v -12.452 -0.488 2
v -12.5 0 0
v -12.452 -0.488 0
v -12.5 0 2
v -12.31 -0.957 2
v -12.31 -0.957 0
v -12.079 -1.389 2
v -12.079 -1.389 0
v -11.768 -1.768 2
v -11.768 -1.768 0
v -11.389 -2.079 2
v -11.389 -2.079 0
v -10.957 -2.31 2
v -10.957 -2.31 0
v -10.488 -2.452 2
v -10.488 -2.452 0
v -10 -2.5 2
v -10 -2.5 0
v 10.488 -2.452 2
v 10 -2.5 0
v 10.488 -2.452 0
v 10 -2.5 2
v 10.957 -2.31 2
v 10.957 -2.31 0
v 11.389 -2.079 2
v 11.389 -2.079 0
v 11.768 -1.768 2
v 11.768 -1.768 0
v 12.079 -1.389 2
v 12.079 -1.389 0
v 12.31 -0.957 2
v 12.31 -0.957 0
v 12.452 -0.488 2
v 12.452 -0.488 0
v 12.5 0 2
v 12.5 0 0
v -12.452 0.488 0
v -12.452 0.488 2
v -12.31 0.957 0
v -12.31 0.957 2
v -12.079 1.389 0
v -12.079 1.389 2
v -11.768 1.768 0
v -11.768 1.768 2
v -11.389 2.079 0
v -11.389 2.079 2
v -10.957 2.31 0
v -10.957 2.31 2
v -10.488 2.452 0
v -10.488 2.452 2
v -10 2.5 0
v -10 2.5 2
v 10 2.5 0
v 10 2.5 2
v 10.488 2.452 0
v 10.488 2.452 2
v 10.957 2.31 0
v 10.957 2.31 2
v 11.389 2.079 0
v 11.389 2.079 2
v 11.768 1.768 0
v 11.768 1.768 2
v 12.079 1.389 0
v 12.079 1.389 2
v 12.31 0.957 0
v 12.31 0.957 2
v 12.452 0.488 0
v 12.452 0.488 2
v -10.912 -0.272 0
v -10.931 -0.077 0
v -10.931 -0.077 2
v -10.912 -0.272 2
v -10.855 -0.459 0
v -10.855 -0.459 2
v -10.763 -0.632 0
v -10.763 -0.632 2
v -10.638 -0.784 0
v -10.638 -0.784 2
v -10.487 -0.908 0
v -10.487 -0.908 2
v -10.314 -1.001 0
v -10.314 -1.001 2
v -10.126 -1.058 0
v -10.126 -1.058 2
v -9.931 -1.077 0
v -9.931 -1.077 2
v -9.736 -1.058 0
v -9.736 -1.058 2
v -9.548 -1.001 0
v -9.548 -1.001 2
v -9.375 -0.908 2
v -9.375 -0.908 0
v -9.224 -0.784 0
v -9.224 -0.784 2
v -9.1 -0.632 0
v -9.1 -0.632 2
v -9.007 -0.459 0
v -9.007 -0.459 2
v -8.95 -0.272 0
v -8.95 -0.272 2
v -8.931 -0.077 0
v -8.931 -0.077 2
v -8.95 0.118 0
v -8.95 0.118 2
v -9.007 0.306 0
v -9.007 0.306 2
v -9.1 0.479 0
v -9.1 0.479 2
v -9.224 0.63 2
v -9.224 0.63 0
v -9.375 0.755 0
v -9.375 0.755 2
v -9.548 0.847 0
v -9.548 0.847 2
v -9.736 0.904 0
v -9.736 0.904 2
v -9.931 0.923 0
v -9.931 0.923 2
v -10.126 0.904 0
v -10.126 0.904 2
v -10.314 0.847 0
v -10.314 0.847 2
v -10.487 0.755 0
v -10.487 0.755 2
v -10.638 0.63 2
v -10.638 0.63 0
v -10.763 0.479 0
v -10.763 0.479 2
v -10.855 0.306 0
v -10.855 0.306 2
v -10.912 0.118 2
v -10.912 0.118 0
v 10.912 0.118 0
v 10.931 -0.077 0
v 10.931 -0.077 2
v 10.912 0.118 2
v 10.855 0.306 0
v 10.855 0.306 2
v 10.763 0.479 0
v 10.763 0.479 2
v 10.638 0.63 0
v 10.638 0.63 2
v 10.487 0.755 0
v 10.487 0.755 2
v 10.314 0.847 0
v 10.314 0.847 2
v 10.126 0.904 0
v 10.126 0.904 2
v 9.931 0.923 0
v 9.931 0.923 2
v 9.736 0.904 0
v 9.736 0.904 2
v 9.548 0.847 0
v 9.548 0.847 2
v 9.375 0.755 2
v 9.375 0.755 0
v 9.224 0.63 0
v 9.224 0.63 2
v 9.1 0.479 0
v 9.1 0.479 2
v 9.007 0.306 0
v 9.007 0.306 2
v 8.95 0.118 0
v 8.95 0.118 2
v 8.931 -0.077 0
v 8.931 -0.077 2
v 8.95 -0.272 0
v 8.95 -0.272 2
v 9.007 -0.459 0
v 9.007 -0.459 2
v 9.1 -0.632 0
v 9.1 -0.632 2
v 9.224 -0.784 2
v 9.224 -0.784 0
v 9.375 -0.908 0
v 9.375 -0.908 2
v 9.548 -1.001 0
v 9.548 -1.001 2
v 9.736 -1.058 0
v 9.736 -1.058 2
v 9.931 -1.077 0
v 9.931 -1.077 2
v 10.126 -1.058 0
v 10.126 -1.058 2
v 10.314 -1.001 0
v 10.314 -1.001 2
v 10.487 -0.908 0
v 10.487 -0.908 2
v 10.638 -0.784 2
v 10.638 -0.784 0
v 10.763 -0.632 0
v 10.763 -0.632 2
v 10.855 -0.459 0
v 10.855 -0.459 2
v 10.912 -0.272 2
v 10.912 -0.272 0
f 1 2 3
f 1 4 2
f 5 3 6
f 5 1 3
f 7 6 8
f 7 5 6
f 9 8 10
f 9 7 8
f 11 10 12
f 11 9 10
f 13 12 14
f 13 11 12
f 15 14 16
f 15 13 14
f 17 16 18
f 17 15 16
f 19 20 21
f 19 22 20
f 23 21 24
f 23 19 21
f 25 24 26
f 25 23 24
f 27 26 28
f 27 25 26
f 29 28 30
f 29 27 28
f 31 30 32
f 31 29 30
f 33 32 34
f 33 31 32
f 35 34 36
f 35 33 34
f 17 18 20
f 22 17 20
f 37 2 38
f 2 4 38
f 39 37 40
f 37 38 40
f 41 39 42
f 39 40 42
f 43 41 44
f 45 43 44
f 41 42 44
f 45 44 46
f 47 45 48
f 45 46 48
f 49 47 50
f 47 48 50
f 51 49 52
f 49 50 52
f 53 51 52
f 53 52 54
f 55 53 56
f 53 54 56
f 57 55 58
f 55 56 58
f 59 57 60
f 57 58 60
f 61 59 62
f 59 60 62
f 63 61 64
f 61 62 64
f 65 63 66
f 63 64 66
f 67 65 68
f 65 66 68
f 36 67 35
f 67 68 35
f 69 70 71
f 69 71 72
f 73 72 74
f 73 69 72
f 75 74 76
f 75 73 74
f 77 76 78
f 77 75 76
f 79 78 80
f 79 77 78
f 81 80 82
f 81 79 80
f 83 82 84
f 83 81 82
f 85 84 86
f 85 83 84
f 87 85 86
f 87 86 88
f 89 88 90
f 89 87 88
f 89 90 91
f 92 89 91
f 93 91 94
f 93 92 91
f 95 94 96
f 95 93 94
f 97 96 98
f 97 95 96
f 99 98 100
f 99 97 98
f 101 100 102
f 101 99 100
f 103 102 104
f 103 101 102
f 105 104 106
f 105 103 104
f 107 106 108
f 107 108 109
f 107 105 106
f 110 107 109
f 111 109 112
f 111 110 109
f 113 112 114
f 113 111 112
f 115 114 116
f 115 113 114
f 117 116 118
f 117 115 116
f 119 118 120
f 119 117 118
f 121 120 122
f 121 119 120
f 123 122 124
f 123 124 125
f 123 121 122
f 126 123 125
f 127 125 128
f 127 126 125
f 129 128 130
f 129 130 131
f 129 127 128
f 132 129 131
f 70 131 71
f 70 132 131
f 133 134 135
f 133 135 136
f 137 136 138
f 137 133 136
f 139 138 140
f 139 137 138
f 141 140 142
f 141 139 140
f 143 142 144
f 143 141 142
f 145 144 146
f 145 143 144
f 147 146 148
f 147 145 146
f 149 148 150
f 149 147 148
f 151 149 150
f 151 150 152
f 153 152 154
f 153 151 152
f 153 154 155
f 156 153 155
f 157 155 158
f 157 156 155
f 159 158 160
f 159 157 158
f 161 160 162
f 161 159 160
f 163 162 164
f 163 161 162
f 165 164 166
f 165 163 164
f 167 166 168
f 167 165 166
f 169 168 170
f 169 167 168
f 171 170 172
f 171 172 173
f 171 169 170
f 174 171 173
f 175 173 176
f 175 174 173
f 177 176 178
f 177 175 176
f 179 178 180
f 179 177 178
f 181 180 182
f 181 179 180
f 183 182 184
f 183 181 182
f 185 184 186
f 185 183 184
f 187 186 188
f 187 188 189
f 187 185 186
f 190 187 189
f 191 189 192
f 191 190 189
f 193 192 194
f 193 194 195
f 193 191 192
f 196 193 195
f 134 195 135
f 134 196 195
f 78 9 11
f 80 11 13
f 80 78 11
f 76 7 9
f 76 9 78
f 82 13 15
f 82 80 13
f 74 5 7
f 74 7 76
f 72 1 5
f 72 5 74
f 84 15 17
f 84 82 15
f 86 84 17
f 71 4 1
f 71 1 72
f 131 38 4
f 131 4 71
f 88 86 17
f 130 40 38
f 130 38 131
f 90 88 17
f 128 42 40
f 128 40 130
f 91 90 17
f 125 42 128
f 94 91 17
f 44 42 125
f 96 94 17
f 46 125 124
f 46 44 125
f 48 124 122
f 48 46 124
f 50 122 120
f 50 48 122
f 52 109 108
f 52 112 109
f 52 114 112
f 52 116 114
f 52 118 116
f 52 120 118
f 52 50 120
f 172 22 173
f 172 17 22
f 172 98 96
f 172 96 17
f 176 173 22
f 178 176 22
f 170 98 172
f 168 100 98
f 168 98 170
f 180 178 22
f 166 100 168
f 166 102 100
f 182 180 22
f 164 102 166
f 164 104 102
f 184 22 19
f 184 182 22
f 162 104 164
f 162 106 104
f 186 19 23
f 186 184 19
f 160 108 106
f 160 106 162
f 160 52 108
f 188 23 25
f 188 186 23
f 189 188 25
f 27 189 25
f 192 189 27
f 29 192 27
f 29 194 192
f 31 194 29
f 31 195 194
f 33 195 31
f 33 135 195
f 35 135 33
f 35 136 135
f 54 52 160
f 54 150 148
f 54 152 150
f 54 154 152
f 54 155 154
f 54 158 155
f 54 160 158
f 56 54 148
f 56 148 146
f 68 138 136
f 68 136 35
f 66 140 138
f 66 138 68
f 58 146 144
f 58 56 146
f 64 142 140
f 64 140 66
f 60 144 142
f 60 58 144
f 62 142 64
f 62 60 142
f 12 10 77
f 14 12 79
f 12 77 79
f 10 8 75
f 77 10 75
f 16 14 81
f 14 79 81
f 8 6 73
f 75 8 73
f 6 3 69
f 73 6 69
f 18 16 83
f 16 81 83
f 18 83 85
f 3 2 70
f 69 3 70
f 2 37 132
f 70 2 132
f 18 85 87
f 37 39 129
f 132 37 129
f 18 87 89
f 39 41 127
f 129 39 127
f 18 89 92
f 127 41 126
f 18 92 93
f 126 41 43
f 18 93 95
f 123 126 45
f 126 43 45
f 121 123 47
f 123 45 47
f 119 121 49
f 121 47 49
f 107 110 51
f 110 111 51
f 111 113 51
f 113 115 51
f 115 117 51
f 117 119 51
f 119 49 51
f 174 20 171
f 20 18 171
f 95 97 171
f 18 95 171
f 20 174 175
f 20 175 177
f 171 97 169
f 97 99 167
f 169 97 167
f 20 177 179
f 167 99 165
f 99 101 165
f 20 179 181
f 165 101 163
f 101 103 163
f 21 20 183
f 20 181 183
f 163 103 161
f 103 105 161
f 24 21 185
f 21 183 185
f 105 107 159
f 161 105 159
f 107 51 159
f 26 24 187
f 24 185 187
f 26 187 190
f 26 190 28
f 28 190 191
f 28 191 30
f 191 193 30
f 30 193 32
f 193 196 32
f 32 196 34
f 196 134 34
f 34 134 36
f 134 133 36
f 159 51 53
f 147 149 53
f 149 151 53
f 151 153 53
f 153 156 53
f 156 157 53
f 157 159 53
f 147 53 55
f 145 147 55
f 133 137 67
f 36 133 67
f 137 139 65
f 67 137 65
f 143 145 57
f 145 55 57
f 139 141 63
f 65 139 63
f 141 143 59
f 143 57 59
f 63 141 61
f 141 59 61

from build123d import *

# Parameters (mm, degrees)
SKETCH1_W           = 25
SKETCH1_H           = 5
SKETCH1_R           = 1
BOSS_EXTRUDE1_DEPTH = 2
FILLET1_R           = 2.5


with BuildPart() as part:
    # Sketch1 → Boss-Extrude1 (new body)
    with BuildSketch(Plane.XY):
        Rectangle(SKETCH1_W, SKETCH1_H)
        with Locations((9.931042695, -0.076752974)):
            Circle(SKETCH1_R, mode=Mode.SUBTRACT)
        with Locations(Location((-9.931042695, -0.076752974, 0), (0, 0, 180))):
            Circle(SKETCH1_R, mode=Mode.SUBTRACT)
    extrude(amount=BOSS_EXTRUDE1_DEPTH)

    # Fillet1
    fillet1_edges = [part.edges().sort_by_distance(p)[0] for p in [
        (-12.5, -2.5, 1),
        (-12.5, 2.5, 1),
        (12.5, -2.5, 1),
        (12.5, 2.5, 1),
    ]]
    fillet(fillet1_edges, radius=FILLET1_R - 0.0001)  # a hair under: the kernel refuses the full size


solid = part.part
